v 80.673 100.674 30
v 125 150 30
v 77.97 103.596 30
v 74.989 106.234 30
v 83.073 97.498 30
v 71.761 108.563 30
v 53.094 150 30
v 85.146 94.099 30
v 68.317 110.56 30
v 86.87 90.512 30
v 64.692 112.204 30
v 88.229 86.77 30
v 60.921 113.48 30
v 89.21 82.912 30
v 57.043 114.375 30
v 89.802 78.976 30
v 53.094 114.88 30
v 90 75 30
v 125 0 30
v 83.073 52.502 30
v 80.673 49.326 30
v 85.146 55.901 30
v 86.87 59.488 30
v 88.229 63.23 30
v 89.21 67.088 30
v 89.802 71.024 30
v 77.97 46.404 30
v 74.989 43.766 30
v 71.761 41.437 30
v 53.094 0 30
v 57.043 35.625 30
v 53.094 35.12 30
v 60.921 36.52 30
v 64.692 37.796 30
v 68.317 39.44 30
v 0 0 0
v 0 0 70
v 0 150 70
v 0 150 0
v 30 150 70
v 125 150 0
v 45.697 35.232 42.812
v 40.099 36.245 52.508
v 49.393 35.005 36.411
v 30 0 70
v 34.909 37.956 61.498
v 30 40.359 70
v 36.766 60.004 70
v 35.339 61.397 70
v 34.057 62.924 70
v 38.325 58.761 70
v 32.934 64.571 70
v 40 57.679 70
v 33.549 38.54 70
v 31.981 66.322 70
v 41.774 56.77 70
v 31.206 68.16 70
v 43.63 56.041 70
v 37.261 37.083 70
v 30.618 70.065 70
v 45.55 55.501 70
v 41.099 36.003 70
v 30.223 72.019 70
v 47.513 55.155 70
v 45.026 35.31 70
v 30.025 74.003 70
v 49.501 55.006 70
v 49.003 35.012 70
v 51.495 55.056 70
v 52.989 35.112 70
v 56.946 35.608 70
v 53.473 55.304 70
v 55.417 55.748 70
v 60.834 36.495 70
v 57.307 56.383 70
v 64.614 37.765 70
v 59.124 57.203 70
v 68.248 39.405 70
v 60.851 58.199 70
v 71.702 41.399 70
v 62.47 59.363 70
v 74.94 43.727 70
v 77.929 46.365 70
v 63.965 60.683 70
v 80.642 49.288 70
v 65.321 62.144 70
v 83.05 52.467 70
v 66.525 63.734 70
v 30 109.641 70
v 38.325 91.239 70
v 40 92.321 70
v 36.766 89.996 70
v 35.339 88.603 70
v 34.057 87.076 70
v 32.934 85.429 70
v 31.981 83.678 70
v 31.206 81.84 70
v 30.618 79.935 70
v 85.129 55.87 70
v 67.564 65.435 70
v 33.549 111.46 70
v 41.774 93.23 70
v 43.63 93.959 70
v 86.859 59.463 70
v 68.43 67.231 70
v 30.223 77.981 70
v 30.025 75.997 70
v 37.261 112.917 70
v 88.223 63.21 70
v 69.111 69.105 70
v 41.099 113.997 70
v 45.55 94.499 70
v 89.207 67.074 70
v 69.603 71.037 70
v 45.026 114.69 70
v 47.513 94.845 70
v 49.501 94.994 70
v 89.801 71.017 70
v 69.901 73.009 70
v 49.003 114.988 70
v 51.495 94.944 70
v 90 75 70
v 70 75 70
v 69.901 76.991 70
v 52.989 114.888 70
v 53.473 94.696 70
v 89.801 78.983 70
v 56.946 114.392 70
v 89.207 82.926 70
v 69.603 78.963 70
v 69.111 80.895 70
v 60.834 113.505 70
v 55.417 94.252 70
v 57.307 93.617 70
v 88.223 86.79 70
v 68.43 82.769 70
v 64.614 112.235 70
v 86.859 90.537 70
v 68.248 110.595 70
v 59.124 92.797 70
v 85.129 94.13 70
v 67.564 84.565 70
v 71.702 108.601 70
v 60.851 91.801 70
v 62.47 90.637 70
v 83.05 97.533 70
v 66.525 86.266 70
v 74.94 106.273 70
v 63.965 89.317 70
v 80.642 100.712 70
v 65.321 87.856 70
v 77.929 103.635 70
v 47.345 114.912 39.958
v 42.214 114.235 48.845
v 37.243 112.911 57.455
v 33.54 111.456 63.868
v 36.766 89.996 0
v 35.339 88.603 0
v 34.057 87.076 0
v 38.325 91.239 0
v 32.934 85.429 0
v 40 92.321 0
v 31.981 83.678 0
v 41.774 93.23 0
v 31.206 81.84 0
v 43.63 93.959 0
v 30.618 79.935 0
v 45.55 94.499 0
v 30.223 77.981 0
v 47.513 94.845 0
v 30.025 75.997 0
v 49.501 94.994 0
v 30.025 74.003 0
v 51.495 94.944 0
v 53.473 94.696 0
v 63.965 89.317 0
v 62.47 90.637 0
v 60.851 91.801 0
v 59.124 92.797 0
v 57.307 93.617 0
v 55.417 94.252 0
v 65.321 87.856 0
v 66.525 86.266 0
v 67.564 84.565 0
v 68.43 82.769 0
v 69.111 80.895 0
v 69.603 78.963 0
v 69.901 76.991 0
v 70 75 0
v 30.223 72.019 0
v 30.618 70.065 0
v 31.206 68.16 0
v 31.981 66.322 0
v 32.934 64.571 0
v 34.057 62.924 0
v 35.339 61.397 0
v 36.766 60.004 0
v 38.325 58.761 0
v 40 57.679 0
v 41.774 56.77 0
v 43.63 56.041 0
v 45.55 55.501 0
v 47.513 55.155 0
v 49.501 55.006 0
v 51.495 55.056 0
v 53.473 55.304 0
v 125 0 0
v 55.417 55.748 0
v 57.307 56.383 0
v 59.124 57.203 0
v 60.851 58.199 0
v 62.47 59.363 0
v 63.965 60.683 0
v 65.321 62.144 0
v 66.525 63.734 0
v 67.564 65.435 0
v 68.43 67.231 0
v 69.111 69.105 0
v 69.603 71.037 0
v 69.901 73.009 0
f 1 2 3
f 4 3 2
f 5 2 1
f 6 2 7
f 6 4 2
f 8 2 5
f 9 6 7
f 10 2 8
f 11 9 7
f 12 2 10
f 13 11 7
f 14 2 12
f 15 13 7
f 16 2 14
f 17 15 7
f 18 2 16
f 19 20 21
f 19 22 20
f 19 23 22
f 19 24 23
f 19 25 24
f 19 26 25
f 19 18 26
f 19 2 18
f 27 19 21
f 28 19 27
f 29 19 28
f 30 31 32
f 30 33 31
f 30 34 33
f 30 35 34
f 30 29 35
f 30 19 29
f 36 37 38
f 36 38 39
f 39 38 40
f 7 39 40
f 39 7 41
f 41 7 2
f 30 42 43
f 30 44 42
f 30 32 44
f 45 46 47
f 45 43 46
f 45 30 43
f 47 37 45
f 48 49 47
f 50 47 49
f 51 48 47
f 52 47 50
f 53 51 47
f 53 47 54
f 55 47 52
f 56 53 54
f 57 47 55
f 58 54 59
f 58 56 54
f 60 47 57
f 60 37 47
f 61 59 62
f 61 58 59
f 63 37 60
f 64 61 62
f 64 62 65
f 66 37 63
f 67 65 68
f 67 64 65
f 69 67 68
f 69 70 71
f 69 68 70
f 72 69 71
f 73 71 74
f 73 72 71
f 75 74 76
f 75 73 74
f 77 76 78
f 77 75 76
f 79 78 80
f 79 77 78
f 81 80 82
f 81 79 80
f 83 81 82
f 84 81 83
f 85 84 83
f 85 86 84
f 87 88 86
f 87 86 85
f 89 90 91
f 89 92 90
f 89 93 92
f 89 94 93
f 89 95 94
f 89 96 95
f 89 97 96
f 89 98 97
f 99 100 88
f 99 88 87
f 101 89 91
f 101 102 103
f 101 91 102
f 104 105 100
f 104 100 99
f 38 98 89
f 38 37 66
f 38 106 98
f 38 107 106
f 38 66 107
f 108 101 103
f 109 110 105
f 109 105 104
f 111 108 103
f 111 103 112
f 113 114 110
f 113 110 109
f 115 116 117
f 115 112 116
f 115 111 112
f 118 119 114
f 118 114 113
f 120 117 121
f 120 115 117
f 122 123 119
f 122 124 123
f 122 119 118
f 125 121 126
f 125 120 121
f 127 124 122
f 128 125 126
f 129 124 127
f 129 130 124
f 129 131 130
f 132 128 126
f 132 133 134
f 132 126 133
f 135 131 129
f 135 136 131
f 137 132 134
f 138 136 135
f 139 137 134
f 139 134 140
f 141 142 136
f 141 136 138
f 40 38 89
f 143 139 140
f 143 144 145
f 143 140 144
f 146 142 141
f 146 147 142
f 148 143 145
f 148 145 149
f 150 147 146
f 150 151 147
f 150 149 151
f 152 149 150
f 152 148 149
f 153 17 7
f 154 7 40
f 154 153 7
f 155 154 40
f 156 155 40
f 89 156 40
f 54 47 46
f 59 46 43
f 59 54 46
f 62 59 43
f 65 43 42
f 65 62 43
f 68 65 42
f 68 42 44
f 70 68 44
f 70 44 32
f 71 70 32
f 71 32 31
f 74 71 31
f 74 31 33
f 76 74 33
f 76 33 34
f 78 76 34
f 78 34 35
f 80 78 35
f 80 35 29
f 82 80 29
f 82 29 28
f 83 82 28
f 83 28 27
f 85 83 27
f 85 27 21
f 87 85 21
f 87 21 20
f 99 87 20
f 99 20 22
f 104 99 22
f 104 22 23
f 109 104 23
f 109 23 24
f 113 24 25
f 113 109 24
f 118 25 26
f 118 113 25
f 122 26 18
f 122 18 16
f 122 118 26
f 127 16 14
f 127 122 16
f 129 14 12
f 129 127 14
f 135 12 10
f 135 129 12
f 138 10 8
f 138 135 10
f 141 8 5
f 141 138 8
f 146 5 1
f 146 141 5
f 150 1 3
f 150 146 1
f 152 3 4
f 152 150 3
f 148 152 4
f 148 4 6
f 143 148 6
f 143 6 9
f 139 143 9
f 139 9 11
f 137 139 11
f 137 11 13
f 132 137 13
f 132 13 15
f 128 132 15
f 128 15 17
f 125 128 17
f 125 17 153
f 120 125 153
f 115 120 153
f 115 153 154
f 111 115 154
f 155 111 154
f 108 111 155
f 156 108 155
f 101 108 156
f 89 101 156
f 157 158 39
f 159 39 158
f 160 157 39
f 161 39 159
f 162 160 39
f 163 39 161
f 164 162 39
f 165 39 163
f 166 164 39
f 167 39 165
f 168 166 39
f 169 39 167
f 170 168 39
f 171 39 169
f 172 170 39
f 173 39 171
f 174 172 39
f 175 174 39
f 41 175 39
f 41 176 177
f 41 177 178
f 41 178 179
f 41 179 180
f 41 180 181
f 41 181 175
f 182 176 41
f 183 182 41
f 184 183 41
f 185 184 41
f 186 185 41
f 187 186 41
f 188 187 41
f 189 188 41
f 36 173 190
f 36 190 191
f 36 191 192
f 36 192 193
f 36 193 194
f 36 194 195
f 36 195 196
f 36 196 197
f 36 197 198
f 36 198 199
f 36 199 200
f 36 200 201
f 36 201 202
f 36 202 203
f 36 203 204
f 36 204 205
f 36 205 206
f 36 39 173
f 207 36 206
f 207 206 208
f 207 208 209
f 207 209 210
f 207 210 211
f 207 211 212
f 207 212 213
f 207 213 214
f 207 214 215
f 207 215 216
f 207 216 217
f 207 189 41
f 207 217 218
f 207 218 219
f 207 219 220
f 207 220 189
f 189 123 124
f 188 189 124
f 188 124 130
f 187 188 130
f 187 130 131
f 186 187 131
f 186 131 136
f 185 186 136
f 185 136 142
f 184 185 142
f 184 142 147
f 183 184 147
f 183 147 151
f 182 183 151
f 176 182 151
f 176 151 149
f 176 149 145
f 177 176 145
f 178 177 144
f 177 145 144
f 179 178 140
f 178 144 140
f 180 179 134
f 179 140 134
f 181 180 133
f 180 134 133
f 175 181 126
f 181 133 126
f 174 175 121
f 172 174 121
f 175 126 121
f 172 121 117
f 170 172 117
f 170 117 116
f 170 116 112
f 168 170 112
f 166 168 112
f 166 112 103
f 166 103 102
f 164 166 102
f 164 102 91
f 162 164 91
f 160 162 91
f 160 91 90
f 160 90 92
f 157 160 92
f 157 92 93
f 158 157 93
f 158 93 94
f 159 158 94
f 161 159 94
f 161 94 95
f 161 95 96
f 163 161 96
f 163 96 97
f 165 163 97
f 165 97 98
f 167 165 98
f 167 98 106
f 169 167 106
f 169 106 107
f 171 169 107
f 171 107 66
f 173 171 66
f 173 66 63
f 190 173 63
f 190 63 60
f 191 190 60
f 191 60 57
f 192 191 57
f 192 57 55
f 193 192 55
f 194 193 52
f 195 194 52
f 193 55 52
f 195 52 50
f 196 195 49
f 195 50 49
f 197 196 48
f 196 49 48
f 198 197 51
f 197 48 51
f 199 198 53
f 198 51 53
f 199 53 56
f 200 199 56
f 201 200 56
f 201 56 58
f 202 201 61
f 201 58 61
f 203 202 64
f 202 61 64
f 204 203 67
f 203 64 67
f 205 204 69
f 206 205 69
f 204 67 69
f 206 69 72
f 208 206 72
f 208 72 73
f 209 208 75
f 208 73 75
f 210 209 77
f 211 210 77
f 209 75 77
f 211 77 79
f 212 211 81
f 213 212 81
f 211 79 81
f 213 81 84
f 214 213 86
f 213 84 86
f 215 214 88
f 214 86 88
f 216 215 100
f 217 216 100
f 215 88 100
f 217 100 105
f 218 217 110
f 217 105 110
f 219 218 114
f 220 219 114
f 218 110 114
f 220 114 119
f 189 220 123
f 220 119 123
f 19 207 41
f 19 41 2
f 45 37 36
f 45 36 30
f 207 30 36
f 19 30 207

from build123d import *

# Parameters (mm, degrees)
F1_DEPTH = 150
F2_R     = 40
F3_DEPTH = 40
F4_R     = 20
F5_DEPTH = 70.001


with BuildPart() as f1:
    # F0 (on Front) → F1 (new body)
    with BuildSketch(Plane.XZ):
        Polygon((0, 70), (0, 0), (125, 0), (125, 30), (53.094011, 30), (30, 70), align=None)
    extrude(amount=-F1_DEPTH)

    # F2 (on face) → F3 (join, through all)
    with BuildSketch(Plane.XY.offset(70)):
        with Locations((50, 75)):
            Circle(F2_R)
    extrude(amount=-F3_DEPTH)

    # F4 (on face) → F5 (cut, through all)
    with BuildSketch(Plane.XY.offset(70)):
        with Locations((50, 75)):
            Circle(F4_R)
    extrude(amount=-F5_DEPTH, mode=Mode.SUBTRACT)


solid = f1.part
